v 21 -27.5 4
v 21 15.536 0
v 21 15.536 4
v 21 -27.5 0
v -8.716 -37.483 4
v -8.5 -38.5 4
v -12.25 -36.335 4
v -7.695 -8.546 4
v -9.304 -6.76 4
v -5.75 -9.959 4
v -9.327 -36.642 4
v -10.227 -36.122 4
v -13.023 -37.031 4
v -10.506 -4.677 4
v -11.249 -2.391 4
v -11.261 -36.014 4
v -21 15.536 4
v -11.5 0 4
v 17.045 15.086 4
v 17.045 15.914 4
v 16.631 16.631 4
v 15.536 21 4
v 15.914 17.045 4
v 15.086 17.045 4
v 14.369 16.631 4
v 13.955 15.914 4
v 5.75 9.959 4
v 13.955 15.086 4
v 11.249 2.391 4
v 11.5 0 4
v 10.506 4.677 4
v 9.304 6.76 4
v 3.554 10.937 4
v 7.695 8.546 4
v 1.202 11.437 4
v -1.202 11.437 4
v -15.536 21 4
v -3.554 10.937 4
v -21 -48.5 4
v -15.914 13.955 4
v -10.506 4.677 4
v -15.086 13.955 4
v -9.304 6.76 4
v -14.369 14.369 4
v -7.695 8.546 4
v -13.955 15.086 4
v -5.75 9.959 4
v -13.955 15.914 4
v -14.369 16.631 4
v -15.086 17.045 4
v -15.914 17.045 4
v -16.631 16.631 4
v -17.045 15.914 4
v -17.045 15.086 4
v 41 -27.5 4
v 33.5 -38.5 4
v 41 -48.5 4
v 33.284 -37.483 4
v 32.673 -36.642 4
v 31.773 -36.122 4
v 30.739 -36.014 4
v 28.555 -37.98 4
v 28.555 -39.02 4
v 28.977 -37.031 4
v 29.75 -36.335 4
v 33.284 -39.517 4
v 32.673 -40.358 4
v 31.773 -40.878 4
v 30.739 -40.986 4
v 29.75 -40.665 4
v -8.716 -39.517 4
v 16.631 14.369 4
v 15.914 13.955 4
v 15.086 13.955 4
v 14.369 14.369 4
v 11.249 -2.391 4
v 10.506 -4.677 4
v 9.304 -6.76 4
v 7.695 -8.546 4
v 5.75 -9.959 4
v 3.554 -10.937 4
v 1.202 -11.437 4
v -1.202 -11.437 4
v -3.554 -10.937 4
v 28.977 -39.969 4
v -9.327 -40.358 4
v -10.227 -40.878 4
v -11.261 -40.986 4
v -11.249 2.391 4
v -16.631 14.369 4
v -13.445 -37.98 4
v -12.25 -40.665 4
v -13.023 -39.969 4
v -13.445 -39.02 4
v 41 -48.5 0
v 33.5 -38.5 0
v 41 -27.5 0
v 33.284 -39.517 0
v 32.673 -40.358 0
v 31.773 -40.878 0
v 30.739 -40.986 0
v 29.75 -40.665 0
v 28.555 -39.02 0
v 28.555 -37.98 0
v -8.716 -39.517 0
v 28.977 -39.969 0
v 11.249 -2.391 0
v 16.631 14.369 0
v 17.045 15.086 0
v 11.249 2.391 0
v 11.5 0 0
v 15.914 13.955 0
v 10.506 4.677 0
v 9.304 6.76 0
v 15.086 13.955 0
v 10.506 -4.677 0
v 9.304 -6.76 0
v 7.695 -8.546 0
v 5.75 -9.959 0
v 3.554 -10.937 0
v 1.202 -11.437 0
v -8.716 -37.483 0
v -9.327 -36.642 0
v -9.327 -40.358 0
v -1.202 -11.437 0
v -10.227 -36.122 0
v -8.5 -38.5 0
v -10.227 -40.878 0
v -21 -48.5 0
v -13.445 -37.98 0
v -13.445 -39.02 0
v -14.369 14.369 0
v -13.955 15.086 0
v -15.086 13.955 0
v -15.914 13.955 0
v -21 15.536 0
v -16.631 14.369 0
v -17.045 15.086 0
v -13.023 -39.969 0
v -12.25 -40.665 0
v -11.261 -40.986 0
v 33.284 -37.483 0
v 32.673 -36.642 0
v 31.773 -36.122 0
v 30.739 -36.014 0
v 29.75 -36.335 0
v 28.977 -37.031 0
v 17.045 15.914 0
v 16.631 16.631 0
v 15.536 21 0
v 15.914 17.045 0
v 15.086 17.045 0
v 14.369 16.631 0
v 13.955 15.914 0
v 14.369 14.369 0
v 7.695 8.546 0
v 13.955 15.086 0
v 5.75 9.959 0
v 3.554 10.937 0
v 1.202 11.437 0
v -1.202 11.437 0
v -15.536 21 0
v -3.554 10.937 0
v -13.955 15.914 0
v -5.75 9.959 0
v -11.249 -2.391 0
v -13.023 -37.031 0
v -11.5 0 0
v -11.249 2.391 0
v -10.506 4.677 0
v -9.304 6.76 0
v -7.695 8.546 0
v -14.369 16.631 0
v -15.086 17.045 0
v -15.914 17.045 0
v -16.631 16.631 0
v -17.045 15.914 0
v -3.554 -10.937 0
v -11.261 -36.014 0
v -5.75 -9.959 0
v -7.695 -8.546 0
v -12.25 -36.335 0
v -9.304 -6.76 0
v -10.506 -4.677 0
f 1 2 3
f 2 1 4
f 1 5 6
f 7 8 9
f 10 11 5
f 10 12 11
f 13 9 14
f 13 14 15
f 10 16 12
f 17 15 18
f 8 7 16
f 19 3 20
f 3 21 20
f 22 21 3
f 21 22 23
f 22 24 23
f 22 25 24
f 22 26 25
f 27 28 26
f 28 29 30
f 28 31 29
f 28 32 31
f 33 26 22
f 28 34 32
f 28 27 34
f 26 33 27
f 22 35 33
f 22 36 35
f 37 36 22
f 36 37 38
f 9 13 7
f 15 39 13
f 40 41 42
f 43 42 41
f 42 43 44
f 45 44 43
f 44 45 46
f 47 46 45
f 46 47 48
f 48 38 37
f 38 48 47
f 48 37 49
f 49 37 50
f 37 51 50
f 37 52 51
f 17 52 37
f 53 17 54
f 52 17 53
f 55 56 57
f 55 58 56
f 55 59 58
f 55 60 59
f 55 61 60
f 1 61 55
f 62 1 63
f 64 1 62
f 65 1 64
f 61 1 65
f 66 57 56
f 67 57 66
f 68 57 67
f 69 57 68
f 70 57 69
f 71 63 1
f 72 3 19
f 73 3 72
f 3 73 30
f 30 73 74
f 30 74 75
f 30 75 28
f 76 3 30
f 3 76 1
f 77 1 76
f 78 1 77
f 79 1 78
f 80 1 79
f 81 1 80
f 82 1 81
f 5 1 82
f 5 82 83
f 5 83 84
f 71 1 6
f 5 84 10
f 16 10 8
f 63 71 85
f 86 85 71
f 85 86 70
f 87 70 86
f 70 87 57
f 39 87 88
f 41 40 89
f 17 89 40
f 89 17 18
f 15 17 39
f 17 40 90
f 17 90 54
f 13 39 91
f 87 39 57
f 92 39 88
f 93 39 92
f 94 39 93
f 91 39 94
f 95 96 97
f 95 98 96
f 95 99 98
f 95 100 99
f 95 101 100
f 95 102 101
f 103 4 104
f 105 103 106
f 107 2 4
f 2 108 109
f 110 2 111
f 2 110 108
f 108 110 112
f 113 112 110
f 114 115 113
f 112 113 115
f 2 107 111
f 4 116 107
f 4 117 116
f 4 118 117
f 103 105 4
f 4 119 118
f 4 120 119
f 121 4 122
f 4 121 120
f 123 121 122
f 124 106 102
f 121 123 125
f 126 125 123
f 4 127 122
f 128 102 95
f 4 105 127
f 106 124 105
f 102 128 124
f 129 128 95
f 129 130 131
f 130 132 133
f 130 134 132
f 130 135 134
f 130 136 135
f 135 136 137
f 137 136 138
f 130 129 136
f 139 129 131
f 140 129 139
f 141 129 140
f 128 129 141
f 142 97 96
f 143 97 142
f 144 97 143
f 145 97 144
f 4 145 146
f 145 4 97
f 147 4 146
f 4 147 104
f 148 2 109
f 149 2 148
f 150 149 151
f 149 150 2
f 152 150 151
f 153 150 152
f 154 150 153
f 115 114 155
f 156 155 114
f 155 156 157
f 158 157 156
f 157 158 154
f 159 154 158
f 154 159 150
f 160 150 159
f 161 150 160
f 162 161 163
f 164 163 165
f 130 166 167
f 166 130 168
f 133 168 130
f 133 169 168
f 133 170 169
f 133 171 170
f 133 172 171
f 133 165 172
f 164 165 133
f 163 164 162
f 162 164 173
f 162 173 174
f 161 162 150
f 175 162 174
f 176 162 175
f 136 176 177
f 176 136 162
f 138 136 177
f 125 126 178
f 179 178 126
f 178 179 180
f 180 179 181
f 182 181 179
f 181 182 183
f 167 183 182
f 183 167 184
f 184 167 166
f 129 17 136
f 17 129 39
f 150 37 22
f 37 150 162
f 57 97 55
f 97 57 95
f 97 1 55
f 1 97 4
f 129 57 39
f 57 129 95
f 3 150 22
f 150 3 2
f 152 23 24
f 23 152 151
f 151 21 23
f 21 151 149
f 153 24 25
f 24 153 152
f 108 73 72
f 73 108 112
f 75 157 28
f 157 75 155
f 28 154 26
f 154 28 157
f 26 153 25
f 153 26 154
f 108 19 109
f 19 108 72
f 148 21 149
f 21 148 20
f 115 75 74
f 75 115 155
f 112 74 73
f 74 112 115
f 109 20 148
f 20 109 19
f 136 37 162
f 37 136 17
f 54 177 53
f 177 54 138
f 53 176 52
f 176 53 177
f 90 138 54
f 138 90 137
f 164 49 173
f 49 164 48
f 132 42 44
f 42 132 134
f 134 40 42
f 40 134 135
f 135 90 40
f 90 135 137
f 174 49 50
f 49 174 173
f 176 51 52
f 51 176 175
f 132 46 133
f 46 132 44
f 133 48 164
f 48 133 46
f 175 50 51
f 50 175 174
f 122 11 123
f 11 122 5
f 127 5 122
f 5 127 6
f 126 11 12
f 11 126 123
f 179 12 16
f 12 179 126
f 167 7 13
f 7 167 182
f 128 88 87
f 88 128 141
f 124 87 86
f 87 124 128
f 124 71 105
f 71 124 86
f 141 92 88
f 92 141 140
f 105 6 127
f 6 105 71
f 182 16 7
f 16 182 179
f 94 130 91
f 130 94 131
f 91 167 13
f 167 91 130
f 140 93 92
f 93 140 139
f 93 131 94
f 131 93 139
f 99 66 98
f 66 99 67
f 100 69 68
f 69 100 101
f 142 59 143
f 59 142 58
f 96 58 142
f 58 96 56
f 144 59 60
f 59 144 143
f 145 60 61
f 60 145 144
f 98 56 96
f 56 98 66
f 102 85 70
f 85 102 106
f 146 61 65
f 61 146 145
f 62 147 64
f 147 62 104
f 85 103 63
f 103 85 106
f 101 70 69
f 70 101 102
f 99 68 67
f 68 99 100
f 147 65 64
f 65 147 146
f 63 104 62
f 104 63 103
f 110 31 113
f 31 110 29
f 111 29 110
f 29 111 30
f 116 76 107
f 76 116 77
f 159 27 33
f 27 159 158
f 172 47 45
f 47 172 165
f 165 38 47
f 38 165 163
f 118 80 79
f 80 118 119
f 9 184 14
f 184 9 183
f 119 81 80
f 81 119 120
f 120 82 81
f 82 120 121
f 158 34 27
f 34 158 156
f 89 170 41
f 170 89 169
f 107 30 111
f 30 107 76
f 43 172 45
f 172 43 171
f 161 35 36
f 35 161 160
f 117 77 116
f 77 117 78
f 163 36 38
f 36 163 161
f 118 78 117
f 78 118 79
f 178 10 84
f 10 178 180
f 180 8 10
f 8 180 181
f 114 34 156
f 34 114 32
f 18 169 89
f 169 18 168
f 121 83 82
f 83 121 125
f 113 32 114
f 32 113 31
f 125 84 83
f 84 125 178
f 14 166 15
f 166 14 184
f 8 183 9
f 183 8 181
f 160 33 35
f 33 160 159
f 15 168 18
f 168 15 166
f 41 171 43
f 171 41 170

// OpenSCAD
thickness=4;
hole_pitch=31;//26;
rad = 6;
notch = false;

module NEMA17_spacer(){
	//body
	difference(){
        union()
        {
            translate([0,-15/2,thickness/2]) cube([hole_pitch+11,hole_pitch+11+15,thickness],center=true);
            translate([20/2,-(hole_pitch+11)/2-15/2-20/2+0.5,thickness/2]) cube([hole_pitch+11+20,20+1,thickness],center=true);
        }
		for(i=[0,1]){
			rotate([0,0,i*90+45]) union() {
				//translate([(hole_pitch-8)*sqrt(2)+2.5-2.5/sqrt(2),0,thickness/2]) {
				translate([(hole_pitch+11)*sqrt(2)/2-4.5*sqrt(2)+5,0,thickness/2]) {
					cube([5,10,thickness+.2],center=true);
				}
				translate([sqrt(2)*hole_pitch/2,0,0]) cylinder(r=3.2/2,h=thickness*4,center=true,$fn=12);
			}
			
		}
        
        translate([-(hole_pitch+11)/2+20/2, -(hole_pitch+11)/2-15/2-20/2, 0]) cylinder(d=5,h=thickness*2.2,center=true, $fn=15);
        translate([+(hole_pitch+11)/2+20/2, -(hole_pitch+11)/2-15/2-20/2, 0]) cylinder(d=5,h=thickness*2.2,center=true, $fn=15);
		cylinder(r=23/2,h=thickness*2.2,center=true); // Changed from 22.4 - AB

	// Corner notch added by AB
		if(notch)
		{
			translate([-hole_pitch/2+3,hole_pitch/2-1,0]) 
			{
					cylinder(r=rad, h=thickness*4,center=true,$fn=20);
					translate([-rad,3,0])
						cube([2*rad,2*rad+6,thickness*4],center=true);
					rotate([0,0,-45])
					translate([-3,rad+3,0])
						cube([2*rad+6,2*rad+6,thickness*4],center=true);
			}
		}
	}
}

NEMA17_spacer();
